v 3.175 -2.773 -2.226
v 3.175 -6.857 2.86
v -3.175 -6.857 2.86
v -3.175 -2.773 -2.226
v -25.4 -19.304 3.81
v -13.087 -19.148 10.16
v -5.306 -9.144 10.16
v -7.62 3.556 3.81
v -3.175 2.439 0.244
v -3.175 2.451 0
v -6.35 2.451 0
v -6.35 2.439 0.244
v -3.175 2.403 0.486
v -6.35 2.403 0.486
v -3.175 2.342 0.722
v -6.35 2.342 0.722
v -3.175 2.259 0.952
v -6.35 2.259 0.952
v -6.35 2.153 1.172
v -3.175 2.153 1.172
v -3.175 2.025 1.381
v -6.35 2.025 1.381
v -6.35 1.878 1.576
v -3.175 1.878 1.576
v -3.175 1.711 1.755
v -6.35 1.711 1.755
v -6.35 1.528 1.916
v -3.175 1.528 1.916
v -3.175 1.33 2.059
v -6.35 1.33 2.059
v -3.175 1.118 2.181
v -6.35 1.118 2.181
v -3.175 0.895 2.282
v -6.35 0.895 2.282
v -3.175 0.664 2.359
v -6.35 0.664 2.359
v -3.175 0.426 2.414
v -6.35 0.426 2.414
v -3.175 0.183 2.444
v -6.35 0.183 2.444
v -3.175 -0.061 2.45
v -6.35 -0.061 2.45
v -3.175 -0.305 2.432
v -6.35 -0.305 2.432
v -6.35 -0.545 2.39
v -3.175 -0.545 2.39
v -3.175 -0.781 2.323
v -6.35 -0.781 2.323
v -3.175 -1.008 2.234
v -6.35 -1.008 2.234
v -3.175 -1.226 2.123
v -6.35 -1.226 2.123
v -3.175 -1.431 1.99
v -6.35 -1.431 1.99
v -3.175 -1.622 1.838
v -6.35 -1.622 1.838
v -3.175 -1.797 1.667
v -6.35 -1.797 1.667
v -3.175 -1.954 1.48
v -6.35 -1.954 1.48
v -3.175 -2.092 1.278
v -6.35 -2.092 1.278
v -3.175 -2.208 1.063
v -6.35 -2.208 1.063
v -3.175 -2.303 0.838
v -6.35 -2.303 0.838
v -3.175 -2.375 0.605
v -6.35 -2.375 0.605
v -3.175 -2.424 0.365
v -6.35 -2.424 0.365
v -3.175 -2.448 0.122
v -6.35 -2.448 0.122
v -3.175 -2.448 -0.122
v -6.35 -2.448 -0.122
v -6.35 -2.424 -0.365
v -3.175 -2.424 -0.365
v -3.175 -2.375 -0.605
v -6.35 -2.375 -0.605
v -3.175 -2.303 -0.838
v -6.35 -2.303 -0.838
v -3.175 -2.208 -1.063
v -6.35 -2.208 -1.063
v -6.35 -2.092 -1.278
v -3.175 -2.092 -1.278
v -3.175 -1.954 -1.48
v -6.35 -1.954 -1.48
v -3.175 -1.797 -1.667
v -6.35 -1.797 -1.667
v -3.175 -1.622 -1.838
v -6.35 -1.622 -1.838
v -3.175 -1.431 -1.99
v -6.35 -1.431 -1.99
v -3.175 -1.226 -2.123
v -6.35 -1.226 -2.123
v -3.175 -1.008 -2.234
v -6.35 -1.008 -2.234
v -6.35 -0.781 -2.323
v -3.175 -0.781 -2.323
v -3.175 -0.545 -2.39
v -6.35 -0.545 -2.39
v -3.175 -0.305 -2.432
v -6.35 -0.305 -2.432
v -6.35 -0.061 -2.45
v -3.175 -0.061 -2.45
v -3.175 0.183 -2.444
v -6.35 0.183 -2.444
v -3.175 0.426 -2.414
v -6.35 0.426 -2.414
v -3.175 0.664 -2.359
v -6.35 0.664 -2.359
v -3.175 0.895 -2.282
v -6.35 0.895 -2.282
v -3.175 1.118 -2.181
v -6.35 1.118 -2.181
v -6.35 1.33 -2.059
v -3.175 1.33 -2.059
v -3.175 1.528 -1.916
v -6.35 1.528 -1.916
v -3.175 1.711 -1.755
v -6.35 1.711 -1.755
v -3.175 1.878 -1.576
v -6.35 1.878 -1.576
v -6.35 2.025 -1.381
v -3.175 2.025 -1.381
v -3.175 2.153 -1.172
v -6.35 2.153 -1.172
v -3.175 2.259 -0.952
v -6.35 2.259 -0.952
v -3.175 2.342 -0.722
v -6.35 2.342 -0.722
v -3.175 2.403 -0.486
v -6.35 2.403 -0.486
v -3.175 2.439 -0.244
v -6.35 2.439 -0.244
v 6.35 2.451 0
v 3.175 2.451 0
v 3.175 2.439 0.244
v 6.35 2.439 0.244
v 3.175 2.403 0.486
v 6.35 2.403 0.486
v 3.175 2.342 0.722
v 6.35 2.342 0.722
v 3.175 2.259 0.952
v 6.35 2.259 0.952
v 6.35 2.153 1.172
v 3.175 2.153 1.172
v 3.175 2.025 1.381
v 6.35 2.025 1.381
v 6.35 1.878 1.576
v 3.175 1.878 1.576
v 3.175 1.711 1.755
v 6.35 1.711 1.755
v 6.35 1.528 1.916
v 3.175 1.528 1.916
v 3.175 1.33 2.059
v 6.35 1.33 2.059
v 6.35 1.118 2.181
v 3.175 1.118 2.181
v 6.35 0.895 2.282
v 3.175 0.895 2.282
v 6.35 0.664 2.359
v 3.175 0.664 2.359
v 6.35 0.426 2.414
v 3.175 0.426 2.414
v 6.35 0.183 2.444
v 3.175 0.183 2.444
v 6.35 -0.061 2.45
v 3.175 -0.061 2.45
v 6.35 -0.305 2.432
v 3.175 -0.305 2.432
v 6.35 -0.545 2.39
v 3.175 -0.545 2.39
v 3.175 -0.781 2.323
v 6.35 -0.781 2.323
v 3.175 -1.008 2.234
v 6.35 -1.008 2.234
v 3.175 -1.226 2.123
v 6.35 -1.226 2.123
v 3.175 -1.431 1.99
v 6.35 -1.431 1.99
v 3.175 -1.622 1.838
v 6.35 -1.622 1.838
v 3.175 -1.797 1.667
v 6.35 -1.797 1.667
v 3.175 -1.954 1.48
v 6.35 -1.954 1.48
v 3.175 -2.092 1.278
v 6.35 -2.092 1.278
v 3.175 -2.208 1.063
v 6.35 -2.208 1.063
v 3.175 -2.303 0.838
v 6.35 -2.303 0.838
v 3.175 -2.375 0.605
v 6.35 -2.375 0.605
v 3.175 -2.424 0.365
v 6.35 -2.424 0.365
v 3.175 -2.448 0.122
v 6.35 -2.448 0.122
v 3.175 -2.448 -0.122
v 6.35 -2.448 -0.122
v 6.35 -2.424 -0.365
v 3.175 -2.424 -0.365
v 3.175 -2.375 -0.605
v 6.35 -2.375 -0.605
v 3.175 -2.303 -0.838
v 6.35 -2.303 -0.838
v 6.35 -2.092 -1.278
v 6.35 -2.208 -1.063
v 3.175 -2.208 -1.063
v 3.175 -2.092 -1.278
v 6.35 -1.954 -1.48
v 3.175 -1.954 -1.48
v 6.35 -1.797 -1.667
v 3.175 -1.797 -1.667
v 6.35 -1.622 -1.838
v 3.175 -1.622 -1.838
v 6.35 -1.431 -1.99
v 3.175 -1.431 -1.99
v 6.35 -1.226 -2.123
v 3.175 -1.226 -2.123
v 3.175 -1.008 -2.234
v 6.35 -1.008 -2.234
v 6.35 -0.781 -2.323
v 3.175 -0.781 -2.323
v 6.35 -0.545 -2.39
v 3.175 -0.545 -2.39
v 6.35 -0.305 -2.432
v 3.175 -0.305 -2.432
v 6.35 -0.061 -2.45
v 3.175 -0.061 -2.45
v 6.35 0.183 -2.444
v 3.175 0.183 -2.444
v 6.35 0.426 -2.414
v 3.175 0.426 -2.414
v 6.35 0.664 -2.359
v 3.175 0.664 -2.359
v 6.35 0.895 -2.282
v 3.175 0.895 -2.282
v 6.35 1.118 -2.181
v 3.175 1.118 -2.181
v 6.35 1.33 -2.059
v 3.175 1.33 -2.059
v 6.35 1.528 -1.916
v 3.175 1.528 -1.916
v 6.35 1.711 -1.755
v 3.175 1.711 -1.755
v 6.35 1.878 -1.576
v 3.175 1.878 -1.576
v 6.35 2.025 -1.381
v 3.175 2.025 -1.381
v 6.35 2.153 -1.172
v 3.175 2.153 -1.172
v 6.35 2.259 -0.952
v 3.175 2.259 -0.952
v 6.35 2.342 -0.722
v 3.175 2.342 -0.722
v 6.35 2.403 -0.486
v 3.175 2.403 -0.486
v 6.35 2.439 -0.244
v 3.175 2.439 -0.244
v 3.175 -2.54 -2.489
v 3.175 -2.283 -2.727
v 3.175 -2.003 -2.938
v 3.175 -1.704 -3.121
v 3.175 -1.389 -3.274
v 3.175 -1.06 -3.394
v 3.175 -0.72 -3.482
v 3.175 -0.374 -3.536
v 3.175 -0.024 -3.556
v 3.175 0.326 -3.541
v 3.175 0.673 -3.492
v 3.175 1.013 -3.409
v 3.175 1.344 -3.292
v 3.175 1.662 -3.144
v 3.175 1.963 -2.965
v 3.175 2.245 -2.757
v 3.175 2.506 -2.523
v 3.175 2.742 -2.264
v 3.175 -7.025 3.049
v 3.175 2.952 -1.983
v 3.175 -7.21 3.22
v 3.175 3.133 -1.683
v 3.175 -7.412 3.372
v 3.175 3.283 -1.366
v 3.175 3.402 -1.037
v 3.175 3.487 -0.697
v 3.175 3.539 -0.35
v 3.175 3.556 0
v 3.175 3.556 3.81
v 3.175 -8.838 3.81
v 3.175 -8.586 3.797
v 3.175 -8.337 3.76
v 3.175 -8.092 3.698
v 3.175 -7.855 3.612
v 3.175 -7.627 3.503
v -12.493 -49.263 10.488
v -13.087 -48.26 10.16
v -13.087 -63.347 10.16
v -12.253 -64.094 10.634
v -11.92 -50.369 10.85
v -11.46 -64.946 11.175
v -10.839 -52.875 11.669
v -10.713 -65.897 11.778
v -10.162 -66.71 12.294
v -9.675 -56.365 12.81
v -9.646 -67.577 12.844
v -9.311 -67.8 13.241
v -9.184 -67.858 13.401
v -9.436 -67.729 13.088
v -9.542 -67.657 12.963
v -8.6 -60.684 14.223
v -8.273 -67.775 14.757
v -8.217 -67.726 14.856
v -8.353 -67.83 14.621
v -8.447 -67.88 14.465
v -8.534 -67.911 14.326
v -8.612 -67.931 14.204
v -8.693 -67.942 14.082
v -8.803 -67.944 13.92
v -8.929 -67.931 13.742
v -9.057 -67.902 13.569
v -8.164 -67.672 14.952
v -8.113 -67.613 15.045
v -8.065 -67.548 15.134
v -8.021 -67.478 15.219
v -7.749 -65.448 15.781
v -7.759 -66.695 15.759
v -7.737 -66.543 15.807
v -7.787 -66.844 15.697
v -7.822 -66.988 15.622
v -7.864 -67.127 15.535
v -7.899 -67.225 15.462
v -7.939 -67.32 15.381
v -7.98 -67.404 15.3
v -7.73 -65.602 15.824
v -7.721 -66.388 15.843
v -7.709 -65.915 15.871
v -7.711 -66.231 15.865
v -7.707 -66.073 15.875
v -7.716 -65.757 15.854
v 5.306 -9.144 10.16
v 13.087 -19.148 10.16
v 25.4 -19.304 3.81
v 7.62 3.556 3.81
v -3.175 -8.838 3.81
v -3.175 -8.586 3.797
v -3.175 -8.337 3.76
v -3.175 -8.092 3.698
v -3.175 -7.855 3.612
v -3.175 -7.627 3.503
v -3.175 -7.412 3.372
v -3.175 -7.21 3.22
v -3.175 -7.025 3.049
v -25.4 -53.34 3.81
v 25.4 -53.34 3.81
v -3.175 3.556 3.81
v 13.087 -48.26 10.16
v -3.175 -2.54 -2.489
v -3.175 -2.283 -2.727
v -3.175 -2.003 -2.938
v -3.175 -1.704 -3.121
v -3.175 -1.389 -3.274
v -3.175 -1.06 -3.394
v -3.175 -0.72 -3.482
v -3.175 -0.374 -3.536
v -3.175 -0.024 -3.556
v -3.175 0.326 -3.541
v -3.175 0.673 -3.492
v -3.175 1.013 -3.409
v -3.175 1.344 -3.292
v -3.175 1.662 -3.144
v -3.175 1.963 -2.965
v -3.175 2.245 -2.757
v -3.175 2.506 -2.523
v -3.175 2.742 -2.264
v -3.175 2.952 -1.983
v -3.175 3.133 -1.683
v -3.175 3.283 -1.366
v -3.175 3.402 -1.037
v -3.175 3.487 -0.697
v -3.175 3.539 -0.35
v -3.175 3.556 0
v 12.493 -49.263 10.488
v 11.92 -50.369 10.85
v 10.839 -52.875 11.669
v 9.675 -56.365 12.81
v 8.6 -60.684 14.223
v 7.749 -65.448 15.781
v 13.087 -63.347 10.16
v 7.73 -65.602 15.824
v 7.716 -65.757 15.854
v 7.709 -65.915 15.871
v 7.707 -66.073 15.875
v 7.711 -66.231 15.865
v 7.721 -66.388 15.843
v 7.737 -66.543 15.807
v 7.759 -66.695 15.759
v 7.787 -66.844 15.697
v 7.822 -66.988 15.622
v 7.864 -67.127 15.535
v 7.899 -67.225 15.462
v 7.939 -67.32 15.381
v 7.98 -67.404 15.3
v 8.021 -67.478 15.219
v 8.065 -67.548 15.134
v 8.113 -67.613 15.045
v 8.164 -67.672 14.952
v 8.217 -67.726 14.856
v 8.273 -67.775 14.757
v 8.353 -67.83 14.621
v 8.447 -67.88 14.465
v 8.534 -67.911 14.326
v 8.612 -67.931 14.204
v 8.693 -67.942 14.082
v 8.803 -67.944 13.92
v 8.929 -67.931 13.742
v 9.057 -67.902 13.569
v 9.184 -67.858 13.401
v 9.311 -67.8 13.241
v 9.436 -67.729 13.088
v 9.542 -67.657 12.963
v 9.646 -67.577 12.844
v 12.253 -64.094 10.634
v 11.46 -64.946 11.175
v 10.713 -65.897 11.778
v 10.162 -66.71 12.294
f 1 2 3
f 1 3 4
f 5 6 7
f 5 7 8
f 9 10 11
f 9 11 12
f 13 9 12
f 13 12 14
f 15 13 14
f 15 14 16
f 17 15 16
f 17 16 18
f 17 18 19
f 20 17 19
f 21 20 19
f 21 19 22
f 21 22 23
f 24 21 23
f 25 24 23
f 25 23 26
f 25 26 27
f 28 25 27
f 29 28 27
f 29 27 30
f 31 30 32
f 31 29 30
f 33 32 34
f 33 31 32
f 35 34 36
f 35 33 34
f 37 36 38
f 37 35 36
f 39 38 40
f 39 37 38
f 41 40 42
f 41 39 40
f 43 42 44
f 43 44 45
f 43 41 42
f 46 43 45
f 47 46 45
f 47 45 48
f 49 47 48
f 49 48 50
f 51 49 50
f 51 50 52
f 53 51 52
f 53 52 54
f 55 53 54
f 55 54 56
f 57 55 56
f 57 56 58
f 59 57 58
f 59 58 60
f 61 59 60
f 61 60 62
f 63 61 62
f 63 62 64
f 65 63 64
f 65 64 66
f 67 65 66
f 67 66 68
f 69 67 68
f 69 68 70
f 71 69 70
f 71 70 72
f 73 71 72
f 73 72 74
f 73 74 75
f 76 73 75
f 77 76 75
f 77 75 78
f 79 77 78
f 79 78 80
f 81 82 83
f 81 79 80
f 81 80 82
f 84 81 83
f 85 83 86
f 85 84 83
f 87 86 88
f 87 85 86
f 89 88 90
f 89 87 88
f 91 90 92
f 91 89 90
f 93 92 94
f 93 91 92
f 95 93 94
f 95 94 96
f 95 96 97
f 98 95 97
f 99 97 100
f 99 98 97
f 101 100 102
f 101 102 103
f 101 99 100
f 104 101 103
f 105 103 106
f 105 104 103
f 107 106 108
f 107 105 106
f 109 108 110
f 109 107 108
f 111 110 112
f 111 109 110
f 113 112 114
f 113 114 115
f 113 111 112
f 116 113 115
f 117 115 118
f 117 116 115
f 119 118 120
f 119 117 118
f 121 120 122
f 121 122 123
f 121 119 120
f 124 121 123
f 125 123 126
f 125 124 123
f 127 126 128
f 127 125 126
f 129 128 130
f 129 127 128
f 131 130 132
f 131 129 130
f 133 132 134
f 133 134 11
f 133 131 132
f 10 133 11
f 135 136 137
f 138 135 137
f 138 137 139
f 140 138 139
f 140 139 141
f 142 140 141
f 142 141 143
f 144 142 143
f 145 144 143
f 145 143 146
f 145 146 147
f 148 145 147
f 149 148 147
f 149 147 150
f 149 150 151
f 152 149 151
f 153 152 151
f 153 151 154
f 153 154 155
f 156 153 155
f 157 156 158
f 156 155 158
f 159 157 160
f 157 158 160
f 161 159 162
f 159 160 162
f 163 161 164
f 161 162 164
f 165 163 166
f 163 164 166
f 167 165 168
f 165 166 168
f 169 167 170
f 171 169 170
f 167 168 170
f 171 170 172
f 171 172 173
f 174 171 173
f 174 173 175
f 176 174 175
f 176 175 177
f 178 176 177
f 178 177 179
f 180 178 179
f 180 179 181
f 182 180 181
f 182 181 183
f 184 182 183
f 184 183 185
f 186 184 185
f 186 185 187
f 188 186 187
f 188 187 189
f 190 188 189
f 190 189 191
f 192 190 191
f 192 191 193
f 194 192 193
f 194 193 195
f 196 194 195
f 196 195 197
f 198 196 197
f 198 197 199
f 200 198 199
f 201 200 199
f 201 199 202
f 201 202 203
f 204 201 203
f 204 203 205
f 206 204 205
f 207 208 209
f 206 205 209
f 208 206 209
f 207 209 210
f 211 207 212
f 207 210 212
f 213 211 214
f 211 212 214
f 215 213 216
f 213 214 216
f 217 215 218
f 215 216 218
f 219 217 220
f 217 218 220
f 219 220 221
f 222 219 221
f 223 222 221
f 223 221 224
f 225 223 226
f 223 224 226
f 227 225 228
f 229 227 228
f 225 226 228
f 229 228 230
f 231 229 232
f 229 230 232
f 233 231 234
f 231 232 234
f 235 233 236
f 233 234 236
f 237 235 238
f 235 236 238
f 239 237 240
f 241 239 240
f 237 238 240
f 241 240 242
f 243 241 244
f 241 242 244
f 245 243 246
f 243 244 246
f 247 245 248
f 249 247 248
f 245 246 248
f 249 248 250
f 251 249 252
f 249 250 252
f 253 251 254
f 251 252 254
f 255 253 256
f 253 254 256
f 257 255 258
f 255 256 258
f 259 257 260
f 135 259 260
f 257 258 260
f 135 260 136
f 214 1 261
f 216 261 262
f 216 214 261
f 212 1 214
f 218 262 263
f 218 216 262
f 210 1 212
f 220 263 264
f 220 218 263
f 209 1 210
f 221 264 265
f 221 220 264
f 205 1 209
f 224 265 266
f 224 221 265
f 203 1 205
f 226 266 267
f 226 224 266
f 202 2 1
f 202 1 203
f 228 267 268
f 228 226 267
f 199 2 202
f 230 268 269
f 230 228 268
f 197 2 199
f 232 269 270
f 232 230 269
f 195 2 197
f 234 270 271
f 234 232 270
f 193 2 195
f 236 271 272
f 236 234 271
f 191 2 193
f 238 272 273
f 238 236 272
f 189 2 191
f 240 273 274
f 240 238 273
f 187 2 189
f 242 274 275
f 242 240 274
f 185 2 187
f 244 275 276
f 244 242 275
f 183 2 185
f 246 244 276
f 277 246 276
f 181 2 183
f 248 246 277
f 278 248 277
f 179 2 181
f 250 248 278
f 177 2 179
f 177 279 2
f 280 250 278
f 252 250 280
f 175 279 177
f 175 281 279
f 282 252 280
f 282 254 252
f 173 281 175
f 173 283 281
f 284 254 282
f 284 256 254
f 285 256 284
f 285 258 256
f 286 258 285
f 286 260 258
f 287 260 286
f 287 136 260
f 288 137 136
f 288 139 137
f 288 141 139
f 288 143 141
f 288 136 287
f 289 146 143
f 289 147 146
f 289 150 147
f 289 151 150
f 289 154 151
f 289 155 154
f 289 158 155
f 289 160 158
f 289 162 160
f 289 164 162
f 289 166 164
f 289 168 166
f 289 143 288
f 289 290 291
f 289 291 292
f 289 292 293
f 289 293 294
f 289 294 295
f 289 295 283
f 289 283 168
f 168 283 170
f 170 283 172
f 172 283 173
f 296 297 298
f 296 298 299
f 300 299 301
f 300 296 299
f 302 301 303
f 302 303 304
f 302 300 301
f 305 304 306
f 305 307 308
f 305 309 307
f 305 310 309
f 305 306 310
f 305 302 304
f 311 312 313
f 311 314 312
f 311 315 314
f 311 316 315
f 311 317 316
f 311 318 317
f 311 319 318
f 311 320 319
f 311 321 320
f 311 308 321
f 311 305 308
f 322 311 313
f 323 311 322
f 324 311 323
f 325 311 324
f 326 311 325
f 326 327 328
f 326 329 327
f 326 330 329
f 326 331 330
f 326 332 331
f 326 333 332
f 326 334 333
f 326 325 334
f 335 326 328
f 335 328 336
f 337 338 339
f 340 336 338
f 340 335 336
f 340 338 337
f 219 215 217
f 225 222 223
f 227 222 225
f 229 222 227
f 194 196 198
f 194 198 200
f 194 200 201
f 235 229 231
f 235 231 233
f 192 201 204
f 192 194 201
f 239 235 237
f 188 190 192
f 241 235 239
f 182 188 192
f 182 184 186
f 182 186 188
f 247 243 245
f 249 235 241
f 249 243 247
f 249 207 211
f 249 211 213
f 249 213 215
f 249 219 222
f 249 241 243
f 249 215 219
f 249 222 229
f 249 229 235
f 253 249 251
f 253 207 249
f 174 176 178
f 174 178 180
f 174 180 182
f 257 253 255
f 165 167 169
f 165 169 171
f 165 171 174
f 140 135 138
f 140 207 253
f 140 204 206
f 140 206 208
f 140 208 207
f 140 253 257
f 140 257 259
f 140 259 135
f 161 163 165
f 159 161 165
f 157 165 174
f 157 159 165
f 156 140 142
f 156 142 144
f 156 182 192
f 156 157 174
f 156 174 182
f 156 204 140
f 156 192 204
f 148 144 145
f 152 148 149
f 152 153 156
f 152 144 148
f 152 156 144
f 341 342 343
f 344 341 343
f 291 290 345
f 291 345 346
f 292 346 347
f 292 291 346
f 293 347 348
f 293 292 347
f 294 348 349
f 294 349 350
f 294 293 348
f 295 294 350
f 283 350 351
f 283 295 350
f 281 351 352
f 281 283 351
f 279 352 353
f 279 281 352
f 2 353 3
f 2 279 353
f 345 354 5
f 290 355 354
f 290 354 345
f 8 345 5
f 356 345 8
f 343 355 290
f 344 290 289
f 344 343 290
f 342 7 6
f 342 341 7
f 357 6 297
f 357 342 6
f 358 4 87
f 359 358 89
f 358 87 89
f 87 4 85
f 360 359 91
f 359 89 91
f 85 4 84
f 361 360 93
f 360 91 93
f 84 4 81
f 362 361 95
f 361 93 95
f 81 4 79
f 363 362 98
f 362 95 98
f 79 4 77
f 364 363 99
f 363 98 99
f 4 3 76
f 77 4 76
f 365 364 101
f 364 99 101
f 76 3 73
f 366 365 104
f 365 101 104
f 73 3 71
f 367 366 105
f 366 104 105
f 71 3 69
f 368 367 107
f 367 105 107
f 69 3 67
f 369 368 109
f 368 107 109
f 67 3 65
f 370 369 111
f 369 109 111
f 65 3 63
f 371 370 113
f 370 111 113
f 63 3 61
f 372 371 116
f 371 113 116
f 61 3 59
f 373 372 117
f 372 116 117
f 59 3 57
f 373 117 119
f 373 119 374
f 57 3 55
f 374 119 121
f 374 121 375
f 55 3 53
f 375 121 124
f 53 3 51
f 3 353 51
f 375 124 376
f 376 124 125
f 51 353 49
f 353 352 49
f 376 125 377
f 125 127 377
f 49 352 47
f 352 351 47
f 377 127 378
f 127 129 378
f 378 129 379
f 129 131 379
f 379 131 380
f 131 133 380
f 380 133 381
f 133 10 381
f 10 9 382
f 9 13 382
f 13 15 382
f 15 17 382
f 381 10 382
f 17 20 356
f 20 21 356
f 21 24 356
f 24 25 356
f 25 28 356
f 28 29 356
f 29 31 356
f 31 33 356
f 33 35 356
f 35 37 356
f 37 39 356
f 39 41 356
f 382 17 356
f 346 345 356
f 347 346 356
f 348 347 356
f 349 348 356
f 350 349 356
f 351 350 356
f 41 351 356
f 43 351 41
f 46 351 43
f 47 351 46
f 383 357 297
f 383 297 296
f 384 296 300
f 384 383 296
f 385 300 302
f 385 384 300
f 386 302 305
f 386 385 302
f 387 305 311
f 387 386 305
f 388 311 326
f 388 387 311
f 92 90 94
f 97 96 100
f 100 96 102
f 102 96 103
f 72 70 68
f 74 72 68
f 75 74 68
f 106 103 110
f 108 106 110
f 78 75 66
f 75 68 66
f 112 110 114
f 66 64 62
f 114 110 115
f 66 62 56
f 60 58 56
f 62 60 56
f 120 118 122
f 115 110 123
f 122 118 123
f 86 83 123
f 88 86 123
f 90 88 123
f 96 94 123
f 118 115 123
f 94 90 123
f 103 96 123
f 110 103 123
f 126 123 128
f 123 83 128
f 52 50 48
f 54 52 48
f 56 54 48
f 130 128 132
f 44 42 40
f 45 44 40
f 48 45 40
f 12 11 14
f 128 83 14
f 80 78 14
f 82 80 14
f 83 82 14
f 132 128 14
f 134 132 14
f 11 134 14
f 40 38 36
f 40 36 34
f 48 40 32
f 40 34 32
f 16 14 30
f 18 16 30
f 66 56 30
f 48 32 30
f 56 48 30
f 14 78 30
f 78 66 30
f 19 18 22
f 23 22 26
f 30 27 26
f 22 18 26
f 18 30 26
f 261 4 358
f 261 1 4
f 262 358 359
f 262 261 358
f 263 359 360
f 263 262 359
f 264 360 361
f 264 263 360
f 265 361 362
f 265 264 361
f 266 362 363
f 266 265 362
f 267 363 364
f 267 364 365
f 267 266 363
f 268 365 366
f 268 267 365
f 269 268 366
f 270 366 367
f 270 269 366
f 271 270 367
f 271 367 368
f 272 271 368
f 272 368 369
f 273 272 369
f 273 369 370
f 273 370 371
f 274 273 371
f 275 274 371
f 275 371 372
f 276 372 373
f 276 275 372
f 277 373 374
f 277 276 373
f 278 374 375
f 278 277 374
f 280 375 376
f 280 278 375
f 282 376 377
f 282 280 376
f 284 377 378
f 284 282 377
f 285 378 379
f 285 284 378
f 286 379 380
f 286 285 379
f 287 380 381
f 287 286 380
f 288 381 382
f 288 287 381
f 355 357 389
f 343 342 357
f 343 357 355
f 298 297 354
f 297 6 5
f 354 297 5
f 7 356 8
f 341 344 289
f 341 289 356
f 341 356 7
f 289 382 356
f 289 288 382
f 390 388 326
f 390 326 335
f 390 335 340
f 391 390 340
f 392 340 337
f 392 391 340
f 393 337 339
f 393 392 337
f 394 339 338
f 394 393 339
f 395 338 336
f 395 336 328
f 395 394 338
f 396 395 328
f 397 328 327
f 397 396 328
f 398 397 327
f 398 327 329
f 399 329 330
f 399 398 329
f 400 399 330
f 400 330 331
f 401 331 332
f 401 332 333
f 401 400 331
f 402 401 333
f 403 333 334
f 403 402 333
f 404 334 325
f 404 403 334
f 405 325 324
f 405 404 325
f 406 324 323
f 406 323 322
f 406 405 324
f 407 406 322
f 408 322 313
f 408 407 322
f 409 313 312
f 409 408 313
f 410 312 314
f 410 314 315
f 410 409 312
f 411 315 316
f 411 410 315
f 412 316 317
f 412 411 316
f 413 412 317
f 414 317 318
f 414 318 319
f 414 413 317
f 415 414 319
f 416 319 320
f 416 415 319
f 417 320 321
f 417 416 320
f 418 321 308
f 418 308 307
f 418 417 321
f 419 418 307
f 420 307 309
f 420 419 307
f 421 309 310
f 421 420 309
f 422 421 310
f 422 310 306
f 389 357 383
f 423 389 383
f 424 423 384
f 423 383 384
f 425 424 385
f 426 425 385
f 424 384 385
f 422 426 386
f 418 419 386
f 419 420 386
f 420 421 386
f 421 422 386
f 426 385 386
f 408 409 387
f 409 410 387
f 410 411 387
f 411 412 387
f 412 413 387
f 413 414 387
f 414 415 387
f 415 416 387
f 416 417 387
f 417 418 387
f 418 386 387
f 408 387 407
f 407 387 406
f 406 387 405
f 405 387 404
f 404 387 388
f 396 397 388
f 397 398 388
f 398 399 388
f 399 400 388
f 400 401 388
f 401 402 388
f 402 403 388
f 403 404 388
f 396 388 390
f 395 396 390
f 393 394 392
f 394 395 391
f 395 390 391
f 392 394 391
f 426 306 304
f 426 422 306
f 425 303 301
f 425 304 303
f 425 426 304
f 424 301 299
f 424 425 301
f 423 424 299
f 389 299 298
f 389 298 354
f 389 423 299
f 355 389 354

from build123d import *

# Parameters (mm, degrees)
F0_R      = 2.4511
F1_DEPTH  = 6.35
F2_DEPTH  = 3.175
F4_DEPTH  = 22.225
F10_W     = 56.74121622
F10_H     = 63.8059750199
F11_DEPTH = 25.4
F16_W     = 82.6793257147
F16_H     = 72.7323014289
F17_DEPTH = 25.4
F19_DEPTH = 50.8
F20_DEPTH = 25.4


with BuildPart() as f1:
    # F0 (on Right) → F1 (new body)
    with BuildSketch(Plane.YZ):
        Circle(F0_R)
    extrude(amount=F1_DEPTH)

    # F0 (on Right) → F2 (join)
    with BuildSketch(Plane.YZ):
        with BuildLine():
            ThreePointArc((-2.7727080887, -2.2264828441), (1.1801241538, -3.3544661247), (3.556, 0))
            ThreePointArc((3.556, 0), (-1.1801241538, 3.3544661247), (-2.7727080887, -2.2264828441))
        make_face()
        Circle(F0_R, mode=Mode.SUBTRACT)
        with BuildLine():
            ThreePointArc((-2.7727080887, -2.2264828441), (-1.1801241538, 3.3544661247), (3.556, 0))
            Line((3.556, 0), (3.556, 3.81))
            Line((3.556, 3.81), (-9.144, 10.16))
            Line((-9.144, 10.16), (-48.26, 10.16))
            Line((-48.26, 10.16), (-65.4478720941, 15.7807023171))
            ThreePointArc((-65.4478720941, 15.7807023171), (-67.5825080121, 15.0880015075), (-67.5765277328, 12.843793596))
            Line((-67.5765277328, 12.843793596), (-53.34, 3.81))
            Line((-53.34, 3.81), (-8.837933323, 3.81))
            ThreePointArc((-8.837933323, 3.81), (-7.7397247856, 3.5603139541), (-6.8574275453, 2.8603448886))
            Line((-6.8574275453, 2.8603448886), (-2.7727080887, -2.2264828441))
        make_face()
    extrude(amount=F2_DEPTH)

    # F3 (on face) → F4 (join)
    with BuildSketch(Plane.YZ.offset(3.175)):
        with BuildLine():
            Line((-8.837933323, 3.81), (3.556, 3.81))
            Line((3.556, 3.81), (-9.144, 10.16))
            Line((-9.144, 10.16), (-48.26, 10.16))
            Line((-48.26, 10.16), (-65.4478720941, 15.7807023171))
            ThreePointArc((-65.4478720941, 15.7807023171), (-67.5825080121, 15.0880015075), (-67.5765277328, 12.843793596))
            Line((-67.5765277328, 12.843793596), (-53.34, 3.81))
            Line((-53.34, 3.81), (-8.837933323, 3.81))
        make_face()
    extrude(amount=F4_DEPTH)

    # F10 (on 3pt) → F11 (cut)
    with BuildSketch(Plane(origin=(6.888273007, 0, 13.3567620635), x_dir=(0.8887708418, 0, -0.4583518198), z_dir=(0.4583518198, 0, 0.8887708418))):
        with Locations((15.902667772, -15.6232602894)):
            Rectangle(F10_W, F10_H)
    extrude(amount=F11_DEPTH, mode=Mode.SUBTRACT)

    # F16 (on 3pt) → F17 (cut)
    with BuildSketch(Plane(origin=(3.3452742707, 2.6018799884, 6.4229265998), x_dir=(0.9005619877, -0.1632211346, -0.4029230293), z_dir=(-0.4347276232, -0.3381214847, -0.8346770365))):
        with Locations((10.8647113666, 5.6677246466)):
            Rectangle(F16_W, F16_H)
    extrude(amount=-F17_DEPTH, mode=Mode.SUBTRACT)

    # F18 (on face) → F19 (cut)
    with BuildSketch(Plane(origin=(0, -47.5262477994, 0), x_dir=(-1, 0, 0), z_dir=(0, 1, 0))):
        with BuildLine():
            Line((-25.4, 10.16), (-13.0869806094, 10.16))
            ThreePointArc((-13.0869806094, 10.16), (-8.7936537349, 13.9337689195), (-6.7809289321, 19.2838087678))
            Line((-6.7809289321, 19.2838087678), (-25.4, 19.48883757))
            Line((-25.4, 19.48883757), (-25.4, 10.16))
        make_face()
    extrude(amount=-F19_DEPTH, mode=Mode.SUBTRACT)

    # F20 (cut): a face of the model
    f20_faces = [f1.faces().sort_by_distance(p)[0] for p in [
        (21.2956602031, -47.5262477994, 8.0433333333),
    ]]
    extrude(f20_faces, amount=-F20_DEPTH, mode=Mode.SUBTRACT)

    # F21: F1 across plane


with BuildPart() as f1_1:
    add(f1.part)
    add(f1.part.mirror(Plane.YZ))


solid = f1_1.part
